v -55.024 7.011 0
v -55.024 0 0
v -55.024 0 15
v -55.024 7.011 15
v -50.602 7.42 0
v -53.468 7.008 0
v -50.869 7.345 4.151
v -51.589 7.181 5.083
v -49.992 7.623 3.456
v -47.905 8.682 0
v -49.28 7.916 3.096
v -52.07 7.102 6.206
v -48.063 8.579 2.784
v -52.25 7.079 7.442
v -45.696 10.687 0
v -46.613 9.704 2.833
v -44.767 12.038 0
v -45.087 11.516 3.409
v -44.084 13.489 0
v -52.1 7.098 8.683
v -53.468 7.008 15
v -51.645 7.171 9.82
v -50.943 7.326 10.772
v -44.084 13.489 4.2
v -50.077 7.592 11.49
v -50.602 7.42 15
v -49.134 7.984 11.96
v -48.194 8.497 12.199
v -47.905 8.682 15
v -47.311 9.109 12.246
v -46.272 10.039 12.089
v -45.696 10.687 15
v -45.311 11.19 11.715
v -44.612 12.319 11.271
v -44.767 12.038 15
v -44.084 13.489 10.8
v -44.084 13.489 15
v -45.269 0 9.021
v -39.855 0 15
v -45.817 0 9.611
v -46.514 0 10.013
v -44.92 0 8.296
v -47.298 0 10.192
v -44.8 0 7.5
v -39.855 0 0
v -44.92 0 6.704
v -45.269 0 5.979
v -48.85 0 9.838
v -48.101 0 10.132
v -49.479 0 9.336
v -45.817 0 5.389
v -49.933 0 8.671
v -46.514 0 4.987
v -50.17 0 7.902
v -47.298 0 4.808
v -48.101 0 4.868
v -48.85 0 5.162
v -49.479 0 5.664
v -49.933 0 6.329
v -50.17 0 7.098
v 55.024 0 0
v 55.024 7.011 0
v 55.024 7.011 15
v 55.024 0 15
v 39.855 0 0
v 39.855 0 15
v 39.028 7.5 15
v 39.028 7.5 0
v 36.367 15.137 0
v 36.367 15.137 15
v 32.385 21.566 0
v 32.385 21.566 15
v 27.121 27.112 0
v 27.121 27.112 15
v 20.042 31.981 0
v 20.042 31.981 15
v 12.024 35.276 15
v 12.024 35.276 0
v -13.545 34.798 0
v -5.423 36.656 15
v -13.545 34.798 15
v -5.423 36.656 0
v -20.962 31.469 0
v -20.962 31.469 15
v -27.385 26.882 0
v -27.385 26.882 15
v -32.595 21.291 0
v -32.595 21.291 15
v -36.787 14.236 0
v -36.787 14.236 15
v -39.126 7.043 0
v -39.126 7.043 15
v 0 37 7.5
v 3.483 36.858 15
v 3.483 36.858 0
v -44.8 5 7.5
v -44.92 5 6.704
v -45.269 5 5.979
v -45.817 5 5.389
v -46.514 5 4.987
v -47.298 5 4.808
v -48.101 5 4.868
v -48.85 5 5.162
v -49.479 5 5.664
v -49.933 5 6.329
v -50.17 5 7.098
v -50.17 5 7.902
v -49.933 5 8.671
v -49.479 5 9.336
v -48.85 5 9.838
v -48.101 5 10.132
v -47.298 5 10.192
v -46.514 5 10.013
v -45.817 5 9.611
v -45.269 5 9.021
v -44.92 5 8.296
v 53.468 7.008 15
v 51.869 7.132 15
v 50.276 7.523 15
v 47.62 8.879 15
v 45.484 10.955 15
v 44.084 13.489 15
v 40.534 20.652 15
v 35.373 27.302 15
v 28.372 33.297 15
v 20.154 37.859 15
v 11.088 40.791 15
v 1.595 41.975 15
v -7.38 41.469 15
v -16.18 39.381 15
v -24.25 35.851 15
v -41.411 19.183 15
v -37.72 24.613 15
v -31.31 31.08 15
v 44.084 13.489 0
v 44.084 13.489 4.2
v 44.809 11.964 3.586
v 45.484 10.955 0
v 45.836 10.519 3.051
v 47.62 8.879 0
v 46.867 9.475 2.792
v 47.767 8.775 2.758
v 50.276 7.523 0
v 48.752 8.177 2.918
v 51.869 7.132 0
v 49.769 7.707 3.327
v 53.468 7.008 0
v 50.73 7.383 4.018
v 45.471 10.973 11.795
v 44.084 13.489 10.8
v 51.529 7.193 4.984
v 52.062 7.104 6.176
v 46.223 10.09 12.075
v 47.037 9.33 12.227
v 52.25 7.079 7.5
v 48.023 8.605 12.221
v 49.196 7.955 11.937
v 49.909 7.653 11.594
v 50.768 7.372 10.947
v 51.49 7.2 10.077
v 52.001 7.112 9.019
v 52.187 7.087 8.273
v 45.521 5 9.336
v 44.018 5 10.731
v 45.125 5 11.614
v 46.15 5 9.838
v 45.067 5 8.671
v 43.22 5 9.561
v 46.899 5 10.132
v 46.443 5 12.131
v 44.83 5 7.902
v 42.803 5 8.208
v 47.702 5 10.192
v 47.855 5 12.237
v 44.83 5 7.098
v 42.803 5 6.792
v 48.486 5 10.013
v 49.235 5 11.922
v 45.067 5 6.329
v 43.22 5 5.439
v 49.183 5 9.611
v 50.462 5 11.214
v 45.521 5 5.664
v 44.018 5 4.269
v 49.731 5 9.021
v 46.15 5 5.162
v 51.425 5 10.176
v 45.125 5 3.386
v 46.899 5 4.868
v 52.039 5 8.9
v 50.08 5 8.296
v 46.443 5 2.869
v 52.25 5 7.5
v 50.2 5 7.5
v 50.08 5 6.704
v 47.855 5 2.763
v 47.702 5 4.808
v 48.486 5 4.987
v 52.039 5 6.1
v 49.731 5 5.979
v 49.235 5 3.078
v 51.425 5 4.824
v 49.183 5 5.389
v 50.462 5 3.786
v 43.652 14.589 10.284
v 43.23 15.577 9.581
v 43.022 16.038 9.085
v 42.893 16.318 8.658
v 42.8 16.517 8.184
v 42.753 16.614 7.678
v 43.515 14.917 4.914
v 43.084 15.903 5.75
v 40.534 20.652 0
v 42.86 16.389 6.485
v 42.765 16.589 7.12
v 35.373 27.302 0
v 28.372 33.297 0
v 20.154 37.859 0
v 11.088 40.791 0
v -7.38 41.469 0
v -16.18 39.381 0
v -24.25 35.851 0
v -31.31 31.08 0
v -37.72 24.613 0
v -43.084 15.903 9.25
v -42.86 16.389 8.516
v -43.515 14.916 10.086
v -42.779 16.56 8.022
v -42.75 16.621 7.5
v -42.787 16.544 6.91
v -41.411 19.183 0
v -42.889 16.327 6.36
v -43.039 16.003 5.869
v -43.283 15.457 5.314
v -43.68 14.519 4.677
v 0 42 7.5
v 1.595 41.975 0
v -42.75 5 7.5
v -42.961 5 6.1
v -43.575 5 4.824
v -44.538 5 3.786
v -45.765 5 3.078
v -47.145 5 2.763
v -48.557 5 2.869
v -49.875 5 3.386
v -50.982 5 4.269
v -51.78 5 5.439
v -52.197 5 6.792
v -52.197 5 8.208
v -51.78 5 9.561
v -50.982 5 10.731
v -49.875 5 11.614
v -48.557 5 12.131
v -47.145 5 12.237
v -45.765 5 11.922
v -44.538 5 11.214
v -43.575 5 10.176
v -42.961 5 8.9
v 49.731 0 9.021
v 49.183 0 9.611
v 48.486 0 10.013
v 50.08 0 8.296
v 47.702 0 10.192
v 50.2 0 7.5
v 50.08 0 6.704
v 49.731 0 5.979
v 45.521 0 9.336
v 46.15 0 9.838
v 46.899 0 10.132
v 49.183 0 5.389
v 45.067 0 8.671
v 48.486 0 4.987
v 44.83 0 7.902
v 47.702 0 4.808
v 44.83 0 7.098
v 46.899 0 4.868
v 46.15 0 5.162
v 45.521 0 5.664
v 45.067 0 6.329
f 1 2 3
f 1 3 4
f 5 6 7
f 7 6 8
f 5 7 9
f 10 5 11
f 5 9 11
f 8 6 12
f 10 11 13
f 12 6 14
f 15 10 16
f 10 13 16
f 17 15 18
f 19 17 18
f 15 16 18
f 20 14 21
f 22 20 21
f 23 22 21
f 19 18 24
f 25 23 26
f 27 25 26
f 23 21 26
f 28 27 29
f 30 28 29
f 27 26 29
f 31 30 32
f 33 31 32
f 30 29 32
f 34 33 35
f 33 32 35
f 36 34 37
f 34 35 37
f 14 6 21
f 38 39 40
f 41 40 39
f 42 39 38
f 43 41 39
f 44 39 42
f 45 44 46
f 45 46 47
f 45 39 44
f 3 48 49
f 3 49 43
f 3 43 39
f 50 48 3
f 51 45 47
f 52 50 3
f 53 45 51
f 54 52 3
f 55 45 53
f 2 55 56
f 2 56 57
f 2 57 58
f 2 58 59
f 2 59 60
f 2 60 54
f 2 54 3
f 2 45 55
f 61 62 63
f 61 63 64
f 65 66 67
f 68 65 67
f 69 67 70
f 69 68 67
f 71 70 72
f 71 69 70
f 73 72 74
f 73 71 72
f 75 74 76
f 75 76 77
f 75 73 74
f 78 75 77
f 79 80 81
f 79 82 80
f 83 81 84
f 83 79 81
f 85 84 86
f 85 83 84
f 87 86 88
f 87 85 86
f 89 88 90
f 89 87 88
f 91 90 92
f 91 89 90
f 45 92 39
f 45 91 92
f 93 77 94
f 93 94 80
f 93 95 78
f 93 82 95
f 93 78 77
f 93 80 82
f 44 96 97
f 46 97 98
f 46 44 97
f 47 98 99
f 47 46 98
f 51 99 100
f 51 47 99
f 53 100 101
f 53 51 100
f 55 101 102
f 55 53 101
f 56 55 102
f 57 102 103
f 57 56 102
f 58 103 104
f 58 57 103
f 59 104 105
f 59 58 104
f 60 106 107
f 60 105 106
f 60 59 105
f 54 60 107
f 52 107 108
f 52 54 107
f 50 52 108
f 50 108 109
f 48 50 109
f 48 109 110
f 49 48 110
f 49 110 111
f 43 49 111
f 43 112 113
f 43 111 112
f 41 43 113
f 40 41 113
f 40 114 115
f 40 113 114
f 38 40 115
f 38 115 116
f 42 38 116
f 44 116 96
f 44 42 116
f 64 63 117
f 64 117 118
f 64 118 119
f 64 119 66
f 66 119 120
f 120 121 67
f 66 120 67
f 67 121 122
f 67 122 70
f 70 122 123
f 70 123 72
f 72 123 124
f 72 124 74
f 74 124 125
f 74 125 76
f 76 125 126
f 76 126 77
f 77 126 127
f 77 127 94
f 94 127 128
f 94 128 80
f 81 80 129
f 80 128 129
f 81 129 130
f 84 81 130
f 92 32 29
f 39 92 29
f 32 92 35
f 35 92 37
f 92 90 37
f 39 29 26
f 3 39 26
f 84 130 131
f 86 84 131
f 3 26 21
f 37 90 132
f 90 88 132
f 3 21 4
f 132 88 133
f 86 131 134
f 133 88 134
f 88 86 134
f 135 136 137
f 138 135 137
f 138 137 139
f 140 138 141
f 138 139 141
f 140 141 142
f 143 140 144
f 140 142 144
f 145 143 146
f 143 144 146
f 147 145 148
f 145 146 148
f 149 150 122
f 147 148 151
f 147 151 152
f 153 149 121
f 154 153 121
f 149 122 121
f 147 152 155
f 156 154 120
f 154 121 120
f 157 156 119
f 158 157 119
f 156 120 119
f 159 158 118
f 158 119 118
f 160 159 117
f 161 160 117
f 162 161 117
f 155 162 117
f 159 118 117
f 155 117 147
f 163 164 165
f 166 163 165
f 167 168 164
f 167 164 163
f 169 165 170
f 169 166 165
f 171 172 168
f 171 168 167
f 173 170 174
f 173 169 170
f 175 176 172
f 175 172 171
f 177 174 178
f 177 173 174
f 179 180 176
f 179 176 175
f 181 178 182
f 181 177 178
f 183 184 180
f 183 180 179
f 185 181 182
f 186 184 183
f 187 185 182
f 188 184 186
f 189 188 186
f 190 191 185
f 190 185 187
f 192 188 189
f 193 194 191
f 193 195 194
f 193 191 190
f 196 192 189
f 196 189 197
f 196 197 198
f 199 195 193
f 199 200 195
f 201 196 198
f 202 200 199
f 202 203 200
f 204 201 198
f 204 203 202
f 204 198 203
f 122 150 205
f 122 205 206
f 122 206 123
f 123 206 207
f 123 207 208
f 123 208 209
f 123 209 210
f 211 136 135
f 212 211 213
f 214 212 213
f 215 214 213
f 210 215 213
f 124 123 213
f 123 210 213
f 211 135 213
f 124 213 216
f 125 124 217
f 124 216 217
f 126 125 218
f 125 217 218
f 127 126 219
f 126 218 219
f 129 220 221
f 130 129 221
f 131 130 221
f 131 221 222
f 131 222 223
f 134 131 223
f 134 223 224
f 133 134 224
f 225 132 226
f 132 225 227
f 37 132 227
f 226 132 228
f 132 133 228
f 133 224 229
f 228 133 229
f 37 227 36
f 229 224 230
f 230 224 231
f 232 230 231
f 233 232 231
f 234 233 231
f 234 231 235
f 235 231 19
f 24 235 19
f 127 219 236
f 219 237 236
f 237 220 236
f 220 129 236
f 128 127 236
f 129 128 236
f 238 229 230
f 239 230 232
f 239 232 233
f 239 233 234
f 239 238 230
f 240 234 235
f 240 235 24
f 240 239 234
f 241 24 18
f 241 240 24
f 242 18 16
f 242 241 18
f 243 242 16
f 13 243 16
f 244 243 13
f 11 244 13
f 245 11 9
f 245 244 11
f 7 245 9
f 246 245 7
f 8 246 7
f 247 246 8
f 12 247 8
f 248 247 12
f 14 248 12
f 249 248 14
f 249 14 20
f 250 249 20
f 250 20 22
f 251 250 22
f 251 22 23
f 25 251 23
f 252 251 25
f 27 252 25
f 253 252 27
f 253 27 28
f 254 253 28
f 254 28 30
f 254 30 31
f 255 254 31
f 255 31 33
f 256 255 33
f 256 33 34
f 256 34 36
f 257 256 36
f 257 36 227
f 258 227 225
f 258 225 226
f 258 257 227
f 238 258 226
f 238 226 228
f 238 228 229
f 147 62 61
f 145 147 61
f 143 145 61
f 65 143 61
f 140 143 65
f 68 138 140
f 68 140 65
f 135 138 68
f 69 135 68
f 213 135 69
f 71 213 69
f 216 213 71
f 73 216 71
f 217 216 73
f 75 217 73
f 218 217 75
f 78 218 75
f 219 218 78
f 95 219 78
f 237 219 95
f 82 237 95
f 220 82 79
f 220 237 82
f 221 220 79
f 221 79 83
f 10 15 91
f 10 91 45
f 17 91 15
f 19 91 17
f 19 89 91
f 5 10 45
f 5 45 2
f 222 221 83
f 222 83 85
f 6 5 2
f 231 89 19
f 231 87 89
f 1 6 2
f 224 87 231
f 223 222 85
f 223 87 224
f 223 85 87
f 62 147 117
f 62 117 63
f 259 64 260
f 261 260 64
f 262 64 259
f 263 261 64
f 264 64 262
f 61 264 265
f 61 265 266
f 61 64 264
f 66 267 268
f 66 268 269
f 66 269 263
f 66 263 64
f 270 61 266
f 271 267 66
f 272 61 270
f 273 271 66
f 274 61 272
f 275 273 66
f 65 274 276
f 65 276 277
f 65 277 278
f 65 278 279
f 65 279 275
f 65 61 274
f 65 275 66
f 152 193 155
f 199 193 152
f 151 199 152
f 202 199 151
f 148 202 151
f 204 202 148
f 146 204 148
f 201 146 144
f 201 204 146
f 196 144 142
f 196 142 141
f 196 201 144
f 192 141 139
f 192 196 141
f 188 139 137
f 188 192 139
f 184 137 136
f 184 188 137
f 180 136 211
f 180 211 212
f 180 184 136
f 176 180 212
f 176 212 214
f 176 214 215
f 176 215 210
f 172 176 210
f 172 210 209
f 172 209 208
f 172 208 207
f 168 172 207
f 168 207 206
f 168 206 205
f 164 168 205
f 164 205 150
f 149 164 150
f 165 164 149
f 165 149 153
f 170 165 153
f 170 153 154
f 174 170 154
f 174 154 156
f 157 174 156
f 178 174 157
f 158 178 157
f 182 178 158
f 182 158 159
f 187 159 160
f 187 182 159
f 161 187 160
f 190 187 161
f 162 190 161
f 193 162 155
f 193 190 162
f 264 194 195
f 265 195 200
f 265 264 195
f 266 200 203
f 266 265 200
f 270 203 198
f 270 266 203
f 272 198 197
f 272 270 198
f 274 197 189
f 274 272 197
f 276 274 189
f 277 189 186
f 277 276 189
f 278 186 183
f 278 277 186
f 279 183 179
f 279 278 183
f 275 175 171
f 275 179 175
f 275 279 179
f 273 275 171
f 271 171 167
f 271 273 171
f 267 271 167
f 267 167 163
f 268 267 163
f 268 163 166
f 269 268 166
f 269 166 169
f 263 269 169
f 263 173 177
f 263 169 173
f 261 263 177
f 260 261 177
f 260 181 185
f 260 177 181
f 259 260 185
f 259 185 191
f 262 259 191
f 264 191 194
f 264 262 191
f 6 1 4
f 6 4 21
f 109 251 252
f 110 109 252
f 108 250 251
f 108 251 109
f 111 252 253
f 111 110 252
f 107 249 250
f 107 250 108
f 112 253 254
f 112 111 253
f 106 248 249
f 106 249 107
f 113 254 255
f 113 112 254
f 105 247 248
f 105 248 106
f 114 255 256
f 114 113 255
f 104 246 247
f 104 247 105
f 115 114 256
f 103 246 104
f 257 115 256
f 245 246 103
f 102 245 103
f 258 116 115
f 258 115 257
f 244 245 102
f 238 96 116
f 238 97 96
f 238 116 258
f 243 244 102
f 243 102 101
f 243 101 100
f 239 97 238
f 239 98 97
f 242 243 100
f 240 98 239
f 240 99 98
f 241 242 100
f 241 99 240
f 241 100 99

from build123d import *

# Parameters (mm, degrees)
BOSS_EXTRUDE1_DEPTH     = 15
FILLET1_R               = 10
SKETCH3_R               = 2.7
CUT_EXTRUDE1_DEPTH      = 17
CUT_EXTRUDE2_DEPTH      = 12
CUT_EXTRUDE2_DEPTH_BACK = 1
SKETCH3_4_R             = 2.7
SKETCH5_R               = 4.75
CUT_EXTRUDE3_DEPTH      = 17


with BuildPart() as part:
    # Sketch1 → Boss-Extrude1 (new body)
    with BuildSketch(Plane.XY):
        with BuildLine():
            Line((-39.855, 0), (-55.024390244, 0))
            Line((-55.024390244, 0), (-55.024390244, 7.011281463))
            Line((-55.024390244, 7.011281463), (-45.900914662, 6.989739898))
            add(Edge.make_bspline(
                [(45.900914662, 6.989739898), (39.351881023, 42), (0, 42), (-39.351881023, 42), (-45.900914662, 6.989739898)],
                knots=[3.308792985, 3.308792985, 3.308792985, 4.71238898, 4.71238898, 6.115984976, 6.115984976, 6.115984976], degree=2, weights=[1, 0.76368265, 1, 0.76368265, 1]))
            Line((45.900914662, 6.989739898), (55.024390244, 7.011281463))
            Line((55.024390244, 7.011281463), (55.024390244, 0))
            Line((55.024390244, 0), (39.855, 0))
            add(Edge.make_bspline(
                [(39.855, 0), (39.855, 37), (0, 37), (-39.855, 37), (-39.855, 0)],
                knots=[0, 0, 0, 1.570796327, 1.570796327, 3.141592654, 3.141592654, 3.141592654], degree=2, weights=[1, 0.707106781, 1, 0.707106781, 1]))
        make_face()
    extrude(amount=BOSS_EXTRUDE1_DEPTH)

    # Fillet1
    fillet1_edges = [part.edges().sort_by_distance(p)[0] for p in [
        (45.900914662, 6.989739898, 7.5),
        (-45.900914662, 6.989739898, 7.5),
    ]]
    fillet(fillet1_edges, radius=FILLET1_R)

    # Sketch3 → Cut-Extrude1 (cut)
    with BuildSketch(Plane(origin=(0, 0, 0), x_dir=(1, 0, 0), z_dir=(0, 1, 0))):
        with Locations((-47.5, -7.5)):
            Circle(SKETCH3_R)
    extrude(amount=CUT_EXTRUDE1_DEPTH, mode=Mode.SUBTRACT)

    # Sketch3<4> → Cut-Extrude2 (cut, two sides: drawn at the far end of the back side and taken through both)
    with BuildSketch(Plane(origin=(0, 0, 0), x_dir=(1, 0, 0), z_dir=(0, 1, 0)).offset(-CUT_EXTRUDE2_DEPTH_BACK)):
        with Locations((47.5, -7.5)):
            Circle(SKETCH3_4_R)
        with Locations((-47.5, -7.5)):
            Circle(SKETCH3_4_R)
    extrude(amount=CUT_EXTRUDE2_DEPTH + CUT_EXTRUDE2_DEPTH_BACK, mode=Mode.SUBTRACT)

    # Sketch5 → Cut-Extrude3 (cut)
    with BuildSketch(Plane(origin=(0, 5, 0), x_dir=(1, 0, 0), z_dir=(0, 1, 0))):
        with Locations((-47.5, -7.5)):
            Circle(SKETCH5_R)
        with Locations((47.5, -7.5)):
            Circle(SKETCH5_R)
    extrude(amount=CUT_EXTRUDE3_DEPTH, mode=Mode.SUBTRACT)


solid = part.part
